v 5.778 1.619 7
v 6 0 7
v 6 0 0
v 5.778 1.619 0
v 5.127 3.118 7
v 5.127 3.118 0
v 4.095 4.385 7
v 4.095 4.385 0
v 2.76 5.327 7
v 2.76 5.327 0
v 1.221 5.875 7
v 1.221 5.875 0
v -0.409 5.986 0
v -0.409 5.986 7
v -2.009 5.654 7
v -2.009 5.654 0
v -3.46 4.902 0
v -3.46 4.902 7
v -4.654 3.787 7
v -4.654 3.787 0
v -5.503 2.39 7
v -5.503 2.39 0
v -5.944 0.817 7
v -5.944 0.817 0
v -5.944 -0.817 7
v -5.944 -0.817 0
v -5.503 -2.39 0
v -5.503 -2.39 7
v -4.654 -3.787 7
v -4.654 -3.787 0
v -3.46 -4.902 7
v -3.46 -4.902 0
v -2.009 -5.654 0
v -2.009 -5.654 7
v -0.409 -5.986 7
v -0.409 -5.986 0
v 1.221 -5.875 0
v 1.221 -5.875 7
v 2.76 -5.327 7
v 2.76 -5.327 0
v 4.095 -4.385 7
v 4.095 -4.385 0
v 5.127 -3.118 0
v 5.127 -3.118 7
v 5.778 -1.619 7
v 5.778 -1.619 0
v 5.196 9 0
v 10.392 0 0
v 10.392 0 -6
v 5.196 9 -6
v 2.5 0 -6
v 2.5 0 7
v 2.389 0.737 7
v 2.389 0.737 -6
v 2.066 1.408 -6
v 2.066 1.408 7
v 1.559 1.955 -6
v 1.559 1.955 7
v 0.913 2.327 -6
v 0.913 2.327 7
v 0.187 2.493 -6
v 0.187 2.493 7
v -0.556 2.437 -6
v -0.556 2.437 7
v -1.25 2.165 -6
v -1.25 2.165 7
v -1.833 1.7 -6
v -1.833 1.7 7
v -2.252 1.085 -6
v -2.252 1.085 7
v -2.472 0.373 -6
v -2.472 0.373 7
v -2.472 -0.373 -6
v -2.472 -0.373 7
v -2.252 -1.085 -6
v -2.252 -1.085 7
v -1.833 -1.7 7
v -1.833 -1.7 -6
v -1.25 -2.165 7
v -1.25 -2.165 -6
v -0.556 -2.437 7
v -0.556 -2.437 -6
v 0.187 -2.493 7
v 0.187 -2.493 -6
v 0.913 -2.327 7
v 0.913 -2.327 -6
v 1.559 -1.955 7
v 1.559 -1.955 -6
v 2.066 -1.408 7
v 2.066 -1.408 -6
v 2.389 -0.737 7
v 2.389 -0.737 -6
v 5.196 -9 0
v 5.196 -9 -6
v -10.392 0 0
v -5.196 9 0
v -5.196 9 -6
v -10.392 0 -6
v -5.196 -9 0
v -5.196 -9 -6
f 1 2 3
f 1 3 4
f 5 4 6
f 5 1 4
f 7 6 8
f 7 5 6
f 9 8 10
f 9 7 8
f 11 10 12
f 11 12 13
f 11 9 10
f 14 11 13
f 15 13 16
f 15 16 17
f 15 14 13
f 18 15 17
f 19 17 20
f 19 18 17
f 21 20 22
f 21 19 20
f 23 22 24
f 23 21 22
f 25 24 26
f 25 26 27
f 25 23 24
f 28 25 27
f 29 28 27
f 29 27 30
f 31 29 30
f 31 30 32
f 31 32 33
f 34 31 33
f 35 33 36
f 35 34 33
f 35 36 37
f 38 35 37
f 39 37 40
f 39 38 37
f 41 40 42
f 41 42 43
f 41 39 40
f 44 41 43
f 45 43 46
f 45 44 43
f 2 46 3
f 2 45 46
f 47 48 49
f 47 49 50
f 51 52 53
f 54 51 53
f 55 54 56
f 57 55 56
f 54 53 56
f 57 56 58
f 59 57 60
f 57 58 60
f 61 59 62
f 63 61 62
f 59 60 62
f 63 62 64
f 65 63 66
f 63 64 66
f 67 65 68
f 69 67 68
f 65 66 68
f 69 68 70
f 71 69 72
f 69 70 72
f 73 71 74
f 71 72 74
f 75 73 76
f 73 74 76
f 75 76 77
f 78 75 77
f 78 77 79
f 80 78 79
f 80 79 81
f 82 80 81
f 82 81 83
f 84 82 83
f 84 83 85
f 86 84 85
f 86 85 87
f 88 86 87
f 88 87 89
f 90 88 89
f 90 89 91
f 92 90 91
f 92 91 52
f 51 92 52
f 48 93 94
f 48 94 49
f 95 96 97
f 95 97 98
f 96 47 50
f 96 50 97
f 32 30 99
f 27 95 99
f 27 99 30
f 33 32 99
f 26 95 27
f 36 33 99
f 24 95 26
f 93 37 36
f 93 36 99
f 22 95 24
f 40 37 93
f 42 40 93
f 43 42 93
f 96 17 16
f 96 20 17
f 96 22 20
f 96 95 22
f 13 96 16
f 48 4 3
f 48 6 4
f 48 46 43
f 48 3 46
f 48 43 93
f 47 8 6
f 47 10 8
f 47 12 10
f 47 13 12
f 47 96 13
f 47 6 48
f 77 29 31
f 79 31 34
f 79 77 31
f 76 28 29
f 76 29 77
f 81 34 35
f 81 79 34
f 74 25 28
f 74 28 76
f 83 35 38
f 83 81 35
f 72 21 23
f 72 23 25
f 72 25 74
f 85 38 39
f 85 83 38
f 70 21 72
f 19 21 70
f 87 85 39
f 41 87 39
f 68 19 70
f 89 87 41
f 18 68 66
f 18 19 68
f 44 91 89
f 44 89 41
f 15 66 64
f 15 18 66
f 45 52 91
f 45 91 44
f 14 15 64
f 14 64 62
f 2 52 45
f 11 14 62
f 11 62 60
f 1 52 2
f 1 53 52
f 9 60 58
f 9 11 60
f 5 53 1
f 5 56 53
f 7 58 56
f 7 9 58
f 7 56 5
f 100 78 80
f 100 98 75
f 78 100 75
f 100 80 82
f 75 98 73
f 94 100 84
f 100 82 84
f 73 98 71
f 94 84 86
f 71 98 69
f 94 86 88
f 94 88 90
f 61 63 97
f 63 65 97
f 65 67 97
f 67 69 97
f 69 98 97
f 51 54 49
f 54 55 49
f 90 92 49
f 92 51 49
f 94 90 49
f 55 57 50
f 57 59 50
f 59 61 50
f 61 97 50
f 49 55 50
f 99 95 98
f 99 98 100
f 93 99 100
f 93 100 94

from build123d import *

# Parameters (mm, degrees)
SKETCH1_R           = 2.5
BOSS_EXTRUDE1_DEPTH = 6
BOSS_EXTRUDE2_START = 7
SKETCH1_3_R         = 6
SKETCH1_3_R_2       = 2.5
BOSS_EXTRUDE2_DEPTH = 7


with BuildPart() as part:
    # Sketch1 → Boss-Extrude1 (new body)
    with BuildSketch(Plane.XY):
        Polygon((5.196152423, -9), (10.392304845, 0), (5.196152423, 9), (-5.196152423, 9), (-10.392304845, 0), (-5.196152423, -9), align=None)
        Circle(SKETCH1_R, mode=Mode.SUBTRACT)
    extrude(amount=-BOSS_EXTRUDE1_DEPTH)

    # Sketch1<3> → Boss-Extrude2 (add)
    with BuildSketch(Plane.XY.offset(BOSS_EXTRUDE2_START)):
        Circle(SKETCH1_3_R)
        Circle(SKETCH1_3_R_2, mode=Mode.SUBTRACT)
    extrude(amount=-BOSS_EXTRUDE2_DEPTH)


solid = part.part
